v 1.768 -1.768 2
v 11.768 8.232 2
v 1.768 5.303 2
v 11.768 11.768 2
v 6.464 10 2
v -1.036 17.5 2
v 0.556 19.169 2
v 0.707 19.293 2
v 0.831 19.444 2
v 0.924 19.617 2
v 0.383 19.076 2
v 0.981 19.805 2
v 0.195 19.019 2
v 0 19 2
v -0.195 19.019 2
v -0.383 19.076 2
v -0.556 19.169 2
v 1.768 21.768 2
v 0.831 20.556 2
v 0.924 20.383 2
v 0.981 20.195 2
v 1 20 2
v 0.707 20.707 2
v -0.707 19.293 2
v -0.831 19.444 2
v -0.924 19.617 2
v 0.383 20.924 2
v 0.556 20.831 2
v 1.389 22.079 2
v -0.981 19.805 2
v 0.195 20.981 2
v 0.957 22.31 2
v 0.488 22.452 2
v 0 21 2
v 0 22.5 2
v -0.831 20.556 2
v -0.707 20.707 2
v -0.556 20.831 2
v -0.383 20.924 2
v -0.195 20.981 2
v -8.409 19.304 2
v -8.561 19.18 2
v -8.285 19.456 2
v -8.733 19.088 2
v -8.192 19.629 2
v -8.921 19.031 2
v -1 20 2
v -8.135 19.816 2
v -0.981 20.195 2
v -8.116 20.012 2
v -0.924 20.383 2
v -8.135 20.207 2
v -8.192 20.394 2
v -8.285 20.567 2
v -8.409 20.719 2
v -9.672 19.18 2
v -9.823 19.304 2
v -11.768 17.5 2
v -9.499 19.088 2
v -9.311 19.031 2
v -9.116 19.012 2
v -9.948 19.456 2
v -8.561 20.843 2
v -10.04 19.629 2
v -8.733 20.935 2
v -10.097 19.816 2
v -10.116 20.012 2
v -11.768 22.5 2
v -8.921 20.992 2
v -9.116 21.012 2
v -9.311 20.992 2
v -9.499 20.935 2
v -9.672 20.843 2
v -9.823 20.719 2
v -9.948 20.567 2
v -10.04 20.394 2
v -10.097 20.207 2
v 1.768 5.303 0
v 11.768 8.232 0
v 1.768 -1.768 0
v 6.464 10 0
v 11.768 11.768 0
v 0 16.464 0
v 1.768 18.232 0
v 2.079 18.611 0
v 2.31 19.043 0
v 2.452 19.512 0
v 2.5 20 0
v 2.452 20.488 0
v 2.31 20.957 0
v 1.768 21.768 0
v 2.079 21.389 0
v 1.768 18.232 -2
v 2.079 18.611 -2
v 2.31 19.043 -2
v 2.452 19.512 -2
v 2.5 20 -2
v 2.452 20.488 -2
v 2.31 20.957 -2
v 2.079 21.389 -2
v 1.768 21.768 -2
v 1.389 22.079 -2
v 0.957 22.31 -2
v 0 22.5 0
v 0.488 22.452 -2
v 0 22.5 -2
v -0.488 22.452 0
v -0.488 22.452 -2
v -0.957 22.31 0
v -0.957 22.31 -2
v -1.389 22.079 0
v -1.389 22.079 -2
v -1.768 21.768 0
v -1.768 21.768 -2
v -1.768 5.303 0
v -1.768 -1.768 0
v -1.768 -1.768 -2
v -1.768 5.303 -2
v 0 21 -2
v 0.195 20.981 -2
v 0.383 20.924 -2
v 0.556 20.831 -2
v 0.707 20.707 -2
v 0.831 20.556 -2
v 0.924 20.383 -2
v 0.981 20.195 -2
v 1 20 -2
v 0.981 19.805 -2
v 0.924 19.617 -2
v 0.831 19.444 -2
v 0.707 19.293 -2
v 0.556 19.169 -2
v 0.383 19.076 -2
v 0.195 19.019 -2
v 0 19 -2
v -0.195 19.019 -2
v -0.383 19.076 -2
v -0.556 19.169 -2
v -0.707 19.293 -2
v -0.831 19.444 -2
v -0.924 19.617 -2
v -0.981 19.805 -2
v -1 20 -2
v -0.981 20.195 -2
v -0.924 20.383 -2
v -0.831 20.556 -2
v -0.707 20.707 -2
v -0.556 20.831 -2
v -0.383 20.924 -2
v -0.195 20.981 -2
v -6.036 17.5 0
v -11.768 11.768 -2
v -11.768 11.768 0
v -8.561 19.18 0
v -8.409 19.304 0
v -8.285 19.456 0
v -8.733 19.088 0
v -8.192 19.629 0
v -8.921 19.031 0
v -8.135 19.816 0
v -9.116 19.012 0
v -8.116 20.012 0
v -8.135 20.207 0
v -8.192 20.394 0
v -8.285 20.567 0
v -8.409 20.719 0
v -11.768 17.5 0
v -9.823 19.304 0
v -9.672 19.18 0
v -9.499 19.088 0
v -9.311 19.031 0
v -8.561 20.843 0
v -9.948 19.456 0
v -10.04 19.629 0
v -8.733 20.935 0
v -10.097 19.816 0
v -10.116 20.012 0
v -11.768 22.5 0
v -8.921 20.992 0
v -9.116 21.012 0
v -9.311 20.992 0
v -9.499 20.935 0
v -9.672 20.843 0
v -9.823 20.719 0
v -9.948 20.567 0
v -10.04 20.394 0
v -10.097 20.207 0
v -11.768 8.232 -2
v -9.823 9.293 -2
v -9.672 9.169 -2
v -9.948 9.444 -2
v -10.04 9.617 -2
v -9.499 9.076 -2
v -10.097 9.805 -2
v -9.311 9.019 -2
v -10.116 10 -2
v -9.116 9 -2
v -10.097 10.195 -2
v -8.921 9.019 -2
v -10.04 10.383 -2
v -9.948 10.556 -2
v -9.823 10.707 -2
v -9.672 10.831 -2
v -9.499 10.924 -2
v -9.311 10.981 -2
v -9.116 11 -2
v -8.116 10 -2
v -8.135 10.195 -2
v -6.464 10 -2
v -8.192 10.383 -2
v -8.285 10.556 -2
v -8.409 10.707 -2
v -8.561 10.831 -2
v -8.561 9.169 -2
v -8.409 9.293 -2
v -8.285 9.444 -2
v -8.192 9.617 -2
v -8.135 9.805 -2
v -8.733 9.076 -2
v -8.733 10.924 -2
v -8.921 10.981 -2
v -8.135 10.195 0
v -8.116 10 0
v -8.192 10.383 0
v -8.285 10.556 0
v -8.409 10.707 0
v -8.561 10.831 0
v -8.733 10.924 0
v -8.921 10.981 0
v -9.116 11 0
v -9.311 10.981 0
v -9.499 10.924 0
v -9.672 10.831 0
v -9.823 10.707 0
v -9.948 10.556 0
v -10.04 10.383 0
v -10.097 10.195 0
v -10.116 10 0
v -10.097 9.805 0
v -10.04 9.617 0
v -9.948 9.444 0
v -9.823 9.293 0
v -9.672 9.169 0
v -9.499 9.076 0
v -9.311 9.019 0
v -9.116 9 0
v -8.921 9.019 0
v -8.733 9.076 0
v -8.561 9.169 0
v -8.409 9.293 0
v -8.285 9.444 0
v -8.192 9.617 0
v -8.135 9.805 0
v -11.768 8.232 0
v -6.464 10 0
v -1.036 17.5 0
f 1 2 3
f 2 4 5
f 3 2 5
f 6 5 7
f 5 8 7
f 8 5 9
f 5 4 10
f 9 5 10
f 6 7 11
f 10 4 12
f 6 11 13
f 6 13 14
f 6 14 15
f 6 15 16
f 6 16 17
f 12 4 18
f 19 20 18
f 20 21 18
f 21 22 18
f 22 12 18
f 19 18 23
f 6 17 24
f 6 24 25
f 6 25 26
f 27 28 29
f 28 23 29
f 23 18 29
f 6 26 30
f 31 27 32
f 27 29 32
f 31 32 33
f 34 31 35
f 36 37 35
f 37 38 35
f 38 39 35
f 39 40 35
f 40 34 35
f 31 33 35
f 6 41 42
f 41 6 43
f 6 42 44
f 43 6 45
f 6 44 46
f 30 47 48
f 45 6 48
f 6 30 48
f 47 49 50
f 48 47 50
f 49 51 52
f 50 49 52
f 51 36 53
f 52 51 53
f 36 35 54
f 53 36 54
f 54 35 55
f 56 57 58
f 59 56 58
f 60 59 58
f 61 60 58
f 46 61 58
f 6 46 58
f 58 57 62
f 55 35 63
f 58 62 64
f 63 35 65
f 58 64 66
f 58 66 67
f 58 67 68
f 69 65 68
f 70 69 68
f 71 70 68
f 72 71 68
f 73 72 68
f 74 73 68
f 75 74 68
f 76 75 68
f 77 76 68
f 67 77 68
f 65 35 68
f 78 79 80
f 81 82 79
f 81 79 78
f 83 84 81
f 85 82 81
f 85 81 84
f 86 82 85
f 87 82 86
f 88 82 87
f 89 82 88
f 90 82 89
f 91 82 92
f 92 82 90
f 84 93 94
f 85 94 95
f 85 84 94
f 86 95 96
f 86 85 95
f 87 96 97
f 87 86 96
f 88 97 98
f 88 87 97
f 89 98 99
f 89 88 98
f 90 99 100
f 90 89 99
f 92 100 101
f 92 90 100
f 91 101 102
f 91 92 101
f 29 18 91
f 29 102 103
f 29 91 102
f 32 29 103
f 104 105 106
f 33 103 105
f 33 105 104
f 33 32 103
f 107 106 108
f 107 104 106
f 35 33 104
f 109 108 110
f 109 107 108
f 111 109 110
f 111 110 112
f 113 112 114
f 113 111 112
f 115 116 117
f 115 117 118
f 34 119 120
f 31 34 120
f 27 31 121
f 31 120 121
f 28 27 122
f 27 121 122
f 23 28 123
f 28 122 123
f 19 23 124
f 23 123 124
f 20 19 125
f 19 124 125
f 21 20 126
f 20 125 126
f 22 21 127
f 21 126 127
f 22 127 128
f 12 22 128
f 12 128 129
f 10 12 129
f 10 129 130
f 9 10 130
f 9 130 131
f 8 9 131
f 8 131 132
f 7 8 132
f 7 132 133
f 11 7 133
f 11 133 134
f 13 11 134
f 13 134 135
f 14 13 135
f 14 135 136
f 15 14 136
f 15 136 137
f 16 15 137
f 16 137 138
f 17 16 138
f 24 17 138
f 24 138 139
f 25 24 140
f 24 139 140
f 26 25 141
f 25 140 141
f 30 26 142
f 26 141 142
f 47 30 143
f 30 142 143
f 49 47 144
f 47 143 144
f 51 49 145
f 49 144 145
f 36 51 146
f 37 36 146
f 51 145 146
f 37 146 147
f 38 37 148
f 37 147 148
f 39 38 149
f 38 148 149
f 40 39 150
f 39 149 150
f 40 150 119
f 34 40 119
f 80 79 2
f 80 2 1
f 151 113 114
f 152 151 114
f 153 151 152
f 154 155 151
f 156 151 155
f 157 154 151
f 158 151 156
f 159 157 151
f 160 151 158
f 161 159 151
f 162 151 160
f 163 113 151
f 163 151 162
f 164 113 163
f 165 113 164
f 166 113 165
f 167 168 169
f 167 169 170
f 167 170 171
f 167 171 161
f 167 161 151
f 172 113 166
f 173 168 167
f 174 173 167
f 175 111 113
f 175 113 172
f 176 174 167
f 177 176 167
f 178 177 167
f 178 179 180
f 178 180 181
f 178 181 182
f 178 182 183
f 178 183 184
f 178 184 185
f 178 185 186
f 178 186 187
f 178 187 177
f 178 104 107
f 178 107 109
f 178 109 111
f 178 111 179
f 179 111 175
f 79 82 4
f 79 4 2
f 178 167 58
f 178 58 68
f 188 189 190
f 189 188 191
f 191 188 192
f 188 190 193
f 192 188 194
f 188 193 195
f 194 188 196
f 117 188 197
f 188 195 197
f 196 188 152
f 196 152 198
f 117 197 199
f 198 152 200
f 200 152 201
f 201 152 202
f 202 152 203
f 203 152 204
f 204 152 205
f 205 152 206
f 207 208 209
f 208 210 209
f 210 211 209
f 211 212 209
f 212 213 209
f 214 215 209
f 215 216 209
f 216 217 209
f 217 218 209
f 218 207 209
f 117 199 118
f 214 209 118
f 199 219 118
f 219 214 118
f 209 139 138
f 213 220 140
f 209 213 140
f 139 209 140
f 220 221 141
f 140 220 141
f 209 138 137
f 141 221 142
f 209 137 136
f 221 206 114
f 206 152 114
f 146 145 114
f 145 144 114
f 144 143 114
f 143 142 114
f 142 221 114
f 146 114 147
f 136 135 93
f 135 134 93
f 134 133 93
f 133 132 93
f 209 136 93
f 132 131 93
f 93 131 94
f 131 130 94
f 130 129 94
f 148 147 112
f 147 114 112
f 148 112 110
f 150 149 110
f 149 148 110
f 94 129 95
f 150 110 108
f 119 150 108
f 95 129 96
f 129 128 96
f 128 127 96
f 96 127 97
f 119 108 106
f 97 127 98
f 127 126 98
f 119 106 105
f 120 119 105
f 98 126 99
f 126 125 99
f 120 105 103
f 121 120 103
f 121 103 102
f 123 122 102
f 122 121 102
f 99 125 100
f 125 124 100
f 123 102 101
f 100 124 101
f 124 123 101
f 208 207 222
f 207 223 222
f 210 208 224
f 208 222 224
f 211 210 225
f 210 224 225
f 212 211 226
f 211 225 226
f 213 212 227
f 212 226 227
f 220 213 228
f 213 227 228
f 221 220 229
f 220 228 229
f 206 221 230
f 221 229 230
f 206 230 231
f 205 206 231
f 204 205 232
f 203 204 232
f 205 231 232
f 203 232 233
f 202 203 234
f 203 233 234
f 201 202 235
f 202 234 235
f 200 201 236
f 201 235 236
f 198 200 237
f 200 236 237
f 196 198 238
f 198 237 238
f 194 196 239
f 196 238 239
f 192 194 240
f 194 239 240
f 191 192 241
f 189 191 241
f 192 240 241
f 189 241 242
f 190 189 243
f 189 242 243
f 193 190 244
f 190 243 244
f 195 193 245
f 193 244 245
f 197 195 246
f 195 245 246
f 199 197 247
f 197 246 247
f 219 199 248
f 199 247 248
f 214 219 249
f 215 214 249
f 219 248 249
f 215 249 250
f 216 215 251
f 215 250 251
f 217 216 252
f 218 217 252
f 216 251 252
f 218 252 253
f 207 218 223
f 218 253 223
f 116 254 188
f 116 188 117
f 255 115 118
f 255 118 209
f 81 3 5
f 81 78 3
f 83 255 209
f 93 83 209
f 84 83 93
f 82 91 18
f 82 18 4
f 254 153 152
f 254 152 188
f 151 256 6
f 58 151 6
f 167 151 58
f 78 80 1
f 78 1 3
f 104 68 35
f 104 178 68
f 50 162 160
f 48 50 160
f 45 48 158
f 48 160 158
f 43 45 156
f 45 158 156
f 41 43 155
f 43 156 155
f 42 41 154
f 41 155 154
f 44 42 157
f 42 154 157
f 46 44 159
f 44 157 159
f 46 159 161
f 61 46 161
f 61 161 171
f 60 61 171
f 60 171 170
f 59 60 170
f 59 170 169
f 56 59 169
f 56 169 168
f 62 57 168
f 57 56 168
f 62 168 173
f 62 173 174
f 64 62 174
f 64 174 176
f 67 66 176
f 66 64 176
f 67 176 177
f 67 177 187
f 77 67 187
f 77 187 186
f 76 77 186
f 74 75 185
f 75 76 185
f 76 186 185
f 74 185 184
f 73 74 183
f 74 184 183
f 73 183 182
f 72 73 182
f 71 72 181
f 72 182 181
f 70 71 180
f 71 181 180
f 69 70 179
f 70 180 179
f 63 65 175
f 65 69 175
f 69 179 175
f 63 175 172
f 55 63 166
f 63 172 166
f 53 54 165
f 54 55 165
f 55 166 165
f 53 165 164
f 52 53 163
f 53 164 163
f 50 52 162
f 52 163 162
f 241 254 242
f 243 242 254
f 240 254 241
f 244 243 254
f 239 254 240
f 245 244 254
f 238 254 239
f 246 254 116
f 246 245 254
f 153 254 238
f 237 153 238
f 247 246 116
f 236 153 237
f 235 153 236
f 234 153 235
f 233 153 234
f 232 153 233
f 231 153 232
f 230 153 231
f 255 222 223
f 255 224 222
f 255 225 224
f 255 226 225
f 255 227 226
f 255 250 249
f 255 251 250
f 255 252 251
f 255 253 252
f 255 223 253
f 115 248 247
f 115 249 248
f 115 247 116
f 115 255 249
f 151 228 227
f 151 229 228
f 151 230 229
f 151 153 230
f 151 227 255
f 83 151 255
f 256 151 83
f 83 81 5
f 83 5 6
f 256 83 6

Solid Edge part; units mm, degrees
sketch "Sketch1" plane through (0, 0, 0) normal (0, 0, 1) x (1, 0, 0)
  line L0 (11.7678, 8.2322) -> (1.7678, -1.7678)
  line L1 (1.7678, -1.7678) -> (1.7678, 5.3033)
  line L2 (1.7678, 5.3033) -> (6.4645, 10)
  line L3 (6.4645, 10) -> (-1.0355, 17.5)
  line L4 (-1.0355, 17.5) -> (-11.7678, 17.5)
  line L5 (-11.7678, 17.5) -> (-11.7678, 22.5)
  line L6 (-11.7678, 22.5) -> (0, 22.5)
  arc A0 (1.7678, 21.7678) -> (0, 22.5) centre (0, 20) ccw
  line L7 (1.7678, 21.7678) -> (11.7678, 11.7678)
  line L8 (11.7678, 11.7678) -> (11.7678, 8.2322)
  circle A1 centre (-9.1161, 20.0115) radius 1
extrude "ExtrudedProtrusion_1" add sketch "Sketch1" along normal blind 2
sketch "Sketch2" plane through (0, 0, 0) normal (0, 0, 1) x (1, 0, 0)
  circle A0 centre (-9.1161, 10) radius 1
  line L0 (-1.7678, 21.7678) -> (-11.7678, 11.7678)
  line L1 (-11.7678, 11.7678) -> (-11.7678, 8.2322)
  line L2 (-11.7678, 8.2322) -> (-1.7678, -1.7678)
  line L3 (-1.7678, -1.7678) -> (-1.7678, 5.3033)
  line L4 (-1.7678, 5.3033) -> (-6.4645, 10)
  line L5 (-6.4645, 10) -> (1.7678, 18.2322)
  arc A1 (-1.7678, 21.7678) -> (1.7678, 18.2322) centre (0, 20) cw
  arc A2 (-1.7678, 21.7678) -> (1.7678, 18.2322) centre (0, 20) cw
  arc A3 (-1.7678, 21.7678) -> (1.7678, 18.2322) centre (0, 20) cw
extrude "ExtrudedProtrusion_2" add sketch "Sketch2" against normal blind 2
hole "Hole_1" at (0, 20, -2) direction (0, 0, 1) diameter 2 end up to next
